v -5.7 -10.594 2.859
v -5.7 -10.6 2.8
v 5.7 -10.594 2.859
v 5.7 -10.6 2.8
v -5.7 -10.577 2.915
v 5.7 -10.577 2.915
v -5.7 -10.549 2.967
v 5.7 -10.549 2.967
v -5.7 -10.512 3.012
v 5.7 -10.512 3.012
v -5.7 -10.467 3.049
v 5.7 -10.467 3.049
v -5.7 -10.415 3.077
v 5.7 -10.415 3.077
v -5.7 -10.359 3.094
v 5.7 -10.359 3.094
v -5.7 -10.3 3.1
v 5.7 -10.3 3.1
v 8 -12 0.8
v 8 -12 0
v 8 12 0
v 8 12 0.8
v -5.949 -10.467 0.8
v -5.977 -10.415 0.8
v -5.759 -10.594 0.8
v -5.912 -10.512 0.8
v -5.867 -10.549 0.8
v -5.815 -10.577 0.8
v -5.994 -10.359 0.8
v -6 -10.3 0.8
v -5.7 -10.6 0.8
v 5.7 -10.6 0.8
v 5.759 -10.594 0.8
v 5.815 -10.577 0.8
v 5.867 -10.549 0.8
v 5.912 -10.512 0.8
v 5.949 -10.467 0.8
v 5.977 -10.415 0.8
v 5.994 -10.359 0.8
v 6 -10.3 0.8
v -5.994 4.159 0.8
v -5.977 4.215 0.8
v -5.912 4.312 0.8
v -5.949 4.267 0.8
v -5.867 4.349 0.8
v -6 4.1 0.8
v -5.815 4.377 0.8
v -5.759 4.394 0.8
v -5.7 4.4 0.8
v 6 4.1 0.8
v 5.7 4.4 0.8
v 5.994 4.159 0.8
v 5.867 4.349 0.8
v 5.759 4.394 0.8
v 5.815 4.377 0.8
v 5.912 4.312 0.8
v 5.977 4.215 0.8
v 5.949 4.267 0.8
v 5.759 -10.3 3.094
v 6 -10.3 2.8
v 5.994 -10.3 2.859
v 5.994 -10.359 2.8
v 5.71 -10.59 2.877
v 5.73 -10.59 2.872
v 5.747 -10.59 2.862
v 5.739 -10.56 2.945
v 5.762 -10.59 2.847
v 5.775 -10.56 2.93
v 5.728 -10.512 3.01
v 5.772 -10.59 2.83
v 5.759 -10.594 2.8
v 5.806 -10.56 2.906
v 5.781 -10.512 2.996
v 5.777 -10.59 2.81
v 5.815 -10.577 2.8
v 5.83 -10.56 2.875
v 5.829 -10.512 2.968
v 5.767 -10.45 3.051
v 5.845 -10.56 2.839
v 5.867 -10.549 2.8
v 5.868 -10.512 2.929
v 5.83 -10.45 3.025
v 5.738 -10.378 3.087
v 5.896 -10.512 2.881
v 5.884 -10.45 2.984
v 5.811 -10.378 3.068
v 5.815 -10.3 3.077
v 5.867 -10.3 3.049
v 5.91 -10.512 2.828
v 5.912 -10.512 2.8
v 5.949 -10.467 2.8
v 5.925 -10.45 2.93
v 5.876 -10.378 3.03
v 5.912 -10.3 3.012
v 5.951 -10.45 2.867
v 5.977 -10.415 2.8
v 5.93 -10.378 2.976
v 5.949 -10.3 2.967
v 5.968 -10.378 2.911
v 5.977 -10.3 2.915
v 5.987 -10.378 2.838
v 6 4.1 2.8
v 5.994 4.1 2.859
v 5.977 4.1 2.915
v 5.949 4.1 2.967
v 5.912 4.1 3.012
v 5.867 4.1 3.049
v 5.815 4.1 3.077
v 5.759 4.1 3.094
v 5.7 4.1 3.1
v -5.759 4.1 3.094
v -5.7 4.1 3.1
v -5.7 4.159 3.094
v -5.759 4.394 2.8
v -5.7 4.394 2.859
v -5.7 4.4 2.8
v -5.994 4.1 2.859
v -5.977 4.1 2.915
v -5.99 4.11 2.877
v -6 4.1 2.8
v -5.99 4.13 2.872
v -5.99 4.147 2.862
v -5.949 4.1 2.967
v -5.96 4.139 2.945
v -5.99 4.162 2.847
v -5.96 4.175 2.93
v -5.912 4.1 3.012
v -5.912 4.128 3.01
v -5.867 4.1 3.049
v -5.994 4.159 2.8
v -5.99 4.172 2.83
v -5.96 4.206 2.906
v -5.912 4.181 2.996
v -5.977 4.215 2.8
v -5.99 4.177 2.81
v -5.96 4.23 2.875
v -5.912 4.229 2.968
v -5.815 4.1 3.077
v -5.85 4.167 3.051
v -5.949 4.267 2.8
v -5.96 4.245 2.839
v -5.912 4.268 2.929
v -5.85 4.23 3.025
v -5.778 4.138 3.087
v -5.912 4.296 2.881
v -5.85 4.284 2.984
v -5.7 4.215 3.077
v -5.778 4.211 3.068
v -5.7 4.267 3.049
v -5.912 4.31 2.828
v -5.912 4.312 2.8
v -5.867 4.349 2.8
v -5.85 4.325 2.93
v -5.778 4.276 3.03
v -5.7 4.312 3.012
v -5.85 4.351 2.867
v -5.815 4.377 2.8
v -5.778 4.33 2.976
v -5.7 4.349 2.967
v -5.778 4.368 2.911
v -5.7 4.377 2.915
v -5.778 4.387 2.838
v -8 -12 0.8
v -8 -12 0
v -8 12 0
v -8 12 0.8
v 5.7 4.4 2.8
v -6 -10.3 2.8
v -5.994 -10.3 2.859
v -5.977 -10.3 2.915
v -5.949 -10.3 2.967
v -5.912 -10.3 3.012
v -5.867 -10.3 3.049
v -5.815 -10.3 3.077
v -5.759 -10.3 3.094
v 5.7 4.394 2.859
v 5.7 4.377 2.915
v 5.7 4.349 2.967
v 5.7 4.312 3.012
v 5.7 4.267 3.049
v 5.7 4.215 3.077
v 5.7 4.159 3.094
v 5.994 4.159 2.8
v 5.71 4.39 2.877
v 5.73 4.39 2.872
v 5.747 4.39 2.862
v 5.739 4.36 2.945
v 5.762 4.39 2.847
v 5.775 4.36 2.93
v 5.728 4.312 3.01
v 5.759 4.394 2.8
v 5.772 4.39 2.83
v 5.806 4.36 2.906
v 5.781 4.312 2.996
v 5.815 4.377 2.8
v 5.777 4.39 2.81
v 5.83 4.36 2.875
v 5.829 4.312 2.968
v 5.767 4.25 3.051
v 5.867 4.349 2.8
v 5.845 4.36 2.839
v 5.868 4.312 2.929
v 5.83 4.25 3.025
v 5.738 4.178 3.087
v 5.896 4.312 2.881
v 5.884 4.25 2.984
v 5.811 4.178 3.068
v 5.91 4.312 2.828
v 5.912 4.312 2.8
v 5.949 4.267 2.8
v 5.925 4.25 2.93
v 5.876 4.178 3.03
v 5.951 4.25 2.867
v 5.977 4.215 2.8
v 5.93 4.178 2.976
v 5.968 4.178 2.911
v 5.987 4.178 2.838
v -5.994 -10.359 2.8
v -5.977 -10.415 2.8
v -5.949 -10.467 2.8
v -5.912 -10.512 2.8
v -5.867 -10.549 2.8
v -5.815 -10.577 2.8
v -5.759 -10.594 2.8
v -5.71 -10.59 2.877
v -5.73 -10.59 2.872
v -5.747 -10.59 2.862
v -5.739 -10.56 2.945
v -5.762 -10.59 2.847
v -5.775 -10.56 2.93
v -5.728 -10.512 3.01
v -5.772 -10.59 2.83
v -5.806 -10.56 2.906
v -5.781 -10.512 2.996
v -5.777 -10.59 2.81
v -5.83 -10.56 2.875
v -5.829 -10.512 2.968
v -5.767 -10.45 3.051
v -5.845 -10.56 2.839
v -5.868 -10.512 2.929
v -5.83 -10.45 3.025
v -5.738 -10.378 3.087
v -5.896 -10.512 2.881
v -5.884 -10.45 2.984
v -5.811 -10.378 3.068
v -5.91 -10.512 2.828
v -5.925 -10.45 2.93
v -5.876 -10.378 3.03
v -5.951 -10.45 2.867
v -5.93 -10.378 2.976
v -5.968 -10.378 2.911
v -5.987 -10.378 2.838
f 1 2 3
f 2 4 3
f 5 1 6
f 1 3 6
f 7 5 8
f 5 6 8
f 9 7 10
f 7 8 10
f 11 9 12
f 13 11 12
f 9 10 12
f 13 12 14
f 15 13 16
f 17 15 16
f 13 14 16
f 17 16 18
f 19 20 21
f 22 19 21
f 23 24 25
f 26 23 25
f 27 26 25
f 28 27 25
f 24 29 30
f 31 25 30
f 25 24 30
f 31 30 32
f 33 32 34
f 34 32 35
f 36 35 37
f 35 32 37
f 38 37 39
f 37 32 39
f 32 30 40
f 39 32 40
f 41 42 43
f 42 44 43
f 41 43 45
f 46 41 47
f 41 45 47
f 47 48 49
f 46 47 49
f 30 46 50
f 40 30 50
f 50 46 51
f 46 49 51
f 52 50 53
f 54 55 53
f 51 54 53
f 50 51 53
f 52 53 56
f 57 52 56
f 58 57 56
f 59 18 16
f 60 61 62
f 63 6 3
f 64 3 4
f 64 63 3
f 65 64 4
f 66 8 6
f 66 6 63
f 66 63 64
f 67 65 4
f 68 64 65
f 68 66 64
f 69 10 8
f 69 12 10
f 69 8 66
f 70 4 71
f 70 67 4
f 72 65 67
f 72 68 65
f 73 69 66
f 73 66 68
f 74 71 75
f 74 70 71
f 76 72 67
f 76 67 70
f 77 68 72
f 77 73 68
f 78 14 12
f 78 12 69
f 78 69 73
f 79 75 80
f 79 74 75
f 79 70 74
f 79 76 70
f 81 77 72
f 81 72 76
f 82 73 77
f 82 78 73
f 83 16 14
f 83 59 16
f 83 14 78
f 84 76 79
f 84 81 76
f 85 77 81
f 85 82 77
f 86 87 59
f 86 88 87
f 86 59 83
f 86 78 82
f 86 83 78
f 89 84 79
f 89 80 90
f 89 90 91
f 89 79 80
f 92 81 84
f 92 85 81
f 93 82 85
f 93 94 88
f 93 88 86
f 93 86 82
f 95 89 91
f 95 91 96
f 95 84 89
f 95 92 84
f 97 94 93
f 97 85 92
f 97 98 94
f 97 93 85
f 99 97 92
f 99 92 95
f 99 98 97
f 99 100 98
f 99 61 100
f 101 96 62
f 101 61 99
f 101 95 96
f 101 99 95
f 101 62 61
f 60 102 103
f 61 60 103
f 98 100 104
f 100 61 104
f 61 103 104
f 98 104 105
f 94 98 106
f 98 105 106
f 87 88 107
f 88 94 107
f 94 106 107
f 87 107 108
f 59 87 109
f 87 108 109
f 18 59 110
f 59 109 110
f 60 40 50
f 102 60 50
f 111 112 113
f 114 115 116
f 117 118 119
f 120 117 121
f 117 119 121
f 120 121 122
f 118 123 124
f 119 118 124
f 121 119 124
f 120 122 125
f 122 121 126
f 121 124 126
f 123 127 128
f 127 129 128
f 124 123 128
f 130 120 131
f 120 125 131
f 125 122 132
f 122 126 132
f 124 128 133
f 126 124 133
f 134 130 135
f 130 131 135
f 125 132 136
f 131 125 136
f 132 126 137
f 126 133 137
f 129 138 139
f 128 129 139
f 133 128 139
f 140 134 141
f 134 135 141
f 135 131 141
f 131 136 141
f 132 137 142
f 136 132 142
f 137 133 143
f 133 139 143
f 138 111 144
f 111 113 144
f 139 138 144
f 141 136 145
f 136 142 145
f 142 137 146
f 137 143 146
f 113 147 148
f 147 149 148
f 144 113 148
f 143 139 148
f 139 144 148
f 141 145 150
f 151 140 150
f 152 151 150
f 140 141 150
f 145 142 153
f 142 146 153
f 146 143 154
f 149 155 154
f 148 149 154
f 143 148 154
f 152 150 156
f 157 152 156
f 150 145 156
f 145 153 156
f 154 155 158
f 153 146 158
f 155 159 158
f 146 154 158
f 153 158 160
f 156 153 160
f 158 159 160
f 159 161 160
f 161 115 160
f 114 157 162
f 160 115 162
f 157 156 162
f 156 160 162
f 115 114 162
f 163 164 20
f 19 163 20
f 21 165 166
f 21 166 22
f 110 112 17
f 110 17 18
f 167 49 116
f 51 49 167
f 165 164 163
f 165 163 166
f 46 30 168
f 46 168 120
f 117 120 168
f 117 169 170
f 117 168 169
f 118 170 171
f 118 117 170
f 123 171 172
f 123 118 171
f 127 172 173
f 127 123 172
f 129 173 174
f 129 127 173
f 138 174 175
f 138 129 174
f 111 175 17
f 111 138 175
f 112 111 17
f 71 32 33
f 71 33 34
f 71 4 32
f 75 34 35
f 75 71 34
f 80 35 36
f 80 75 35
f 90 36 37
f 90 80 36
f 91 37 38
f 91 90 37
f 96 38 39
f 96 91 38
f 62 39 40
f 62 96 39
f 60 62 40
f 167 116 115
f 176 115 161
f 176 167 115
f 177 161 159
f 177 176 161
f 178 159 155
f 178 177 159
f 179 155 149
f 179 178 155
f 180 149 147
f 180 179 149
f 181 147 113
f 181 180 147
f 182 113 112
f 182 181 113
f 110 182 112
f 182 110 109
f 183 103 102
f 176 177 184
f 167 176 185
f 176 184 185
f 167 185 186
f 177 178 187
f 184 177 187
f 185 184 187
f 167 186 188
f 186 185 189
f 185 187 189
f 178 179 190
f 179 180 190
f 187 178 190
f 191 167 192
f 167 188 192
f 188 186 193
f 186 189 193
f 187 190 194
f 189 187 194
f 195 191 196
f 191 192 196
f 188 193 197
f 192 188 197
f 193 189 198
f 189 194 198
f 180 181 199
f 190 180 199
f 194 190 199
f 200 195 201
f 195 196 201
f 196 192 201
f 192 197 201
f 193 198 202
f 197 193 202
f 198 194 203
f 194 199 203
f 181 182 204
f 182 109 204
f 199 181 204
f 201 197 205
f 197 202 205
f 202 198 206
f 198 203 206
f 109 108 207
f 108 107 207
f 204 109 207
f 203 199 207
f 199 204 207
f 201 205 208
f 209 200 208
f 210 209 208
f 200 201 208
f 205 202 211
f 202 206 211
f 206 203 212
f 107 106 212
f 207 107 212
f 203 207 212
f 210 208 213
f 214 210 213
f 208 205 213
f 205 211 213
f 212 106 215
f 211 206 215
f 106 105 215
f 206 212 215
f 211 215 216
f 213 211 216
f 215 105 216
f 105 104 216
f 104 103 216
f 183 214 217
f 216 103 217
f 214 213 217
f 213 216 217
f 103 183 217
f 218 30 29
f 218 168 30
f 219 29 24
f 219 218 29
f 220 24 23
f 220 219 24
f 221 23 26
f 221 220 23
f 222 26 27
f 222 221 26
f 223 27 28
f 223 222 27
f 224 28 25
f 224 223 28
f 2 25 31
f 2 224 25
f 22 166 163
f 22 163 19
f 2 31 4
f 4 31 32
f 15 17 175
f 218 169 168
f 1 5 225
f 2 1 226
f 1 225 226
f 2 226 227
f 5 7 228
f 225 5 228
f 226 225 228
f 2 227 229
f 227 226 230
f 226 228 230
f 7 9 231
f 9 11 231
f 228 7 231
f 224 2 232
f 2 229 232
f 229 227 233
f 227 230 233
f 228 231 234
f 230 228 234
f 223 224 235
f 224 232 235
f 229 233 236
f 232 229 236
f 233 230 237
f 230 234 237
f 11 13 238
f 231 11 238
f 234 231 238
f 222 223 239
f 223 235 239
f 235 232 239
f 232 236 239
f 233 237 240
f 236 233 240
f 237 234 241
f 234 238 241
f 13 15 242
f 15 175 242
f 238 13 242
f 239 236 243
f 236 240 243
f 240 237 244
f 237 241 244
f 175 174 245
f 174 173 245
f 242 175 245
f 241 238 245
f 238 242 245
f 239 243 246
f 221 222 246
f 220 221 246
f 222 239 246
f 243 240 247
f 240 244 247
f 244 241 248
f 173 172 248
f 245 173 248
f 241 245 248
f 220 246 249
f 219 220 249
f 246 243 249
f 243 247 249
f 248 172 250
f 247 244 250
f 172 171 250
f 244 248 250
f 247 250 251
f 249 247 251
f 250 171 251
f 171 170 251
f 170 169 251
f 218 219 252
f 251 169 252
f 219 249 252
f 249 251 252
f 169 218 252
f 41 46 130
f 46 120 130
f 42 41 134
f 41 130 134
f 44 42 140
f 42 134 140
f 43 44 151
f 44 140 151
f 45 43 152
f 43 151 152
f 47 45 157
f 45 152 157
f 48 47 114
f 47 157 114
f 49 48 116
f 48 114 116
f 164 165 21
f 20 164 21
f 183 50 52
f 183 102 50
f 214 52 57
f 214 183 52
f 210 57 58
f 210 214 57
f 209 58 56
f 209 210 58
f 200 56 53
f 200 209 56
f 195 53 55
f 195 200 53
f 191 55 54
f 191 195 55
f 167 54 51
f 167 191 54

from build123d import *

# Parameters (mm, degrees)
F0_W     = 16
F0_H     = 24
F1_DEPTH = 0.8
F2_W     = 12
F2_H     = 15
F3_DEPTH = 2.3
F4_R     = 0.3


with BuildPart() as f1:
    # F0 (on Top) → F1 (new body)
    with BuildSketch(Plane.XY):
        Rectangle(F0_W, F0_H)
    extrude(amount=F1_DEPTH)


with BuildPart() as f3:
    # F2 (on face) → F3 (new body)
    with BuildSketch(Plane.XY.offset(0.8)):
        with Locations((0, -3.1)):
            Rectangle(F2_W, F2_H)
    extrude(amount=F3_DEPTH)

    # F4
    f4_edges = [f3.edges().sort_by_distance(p)[0] for p in [
        (6, -3.1, 3.1),
        (0, 4.4, 3.1),
        (-6, -3.1, 3.1),
        (0, -10.6, 3.1),
        (-6, 4.4, 1.95),
        (6, 4.4, 1.95),
        (-6, -10.6, 1.95),
        (6, -10.6, 1.95),
    ]]
    fillet(f4_edges, radius=F4_R)


solid = Compound([f1.part, f3.part])
